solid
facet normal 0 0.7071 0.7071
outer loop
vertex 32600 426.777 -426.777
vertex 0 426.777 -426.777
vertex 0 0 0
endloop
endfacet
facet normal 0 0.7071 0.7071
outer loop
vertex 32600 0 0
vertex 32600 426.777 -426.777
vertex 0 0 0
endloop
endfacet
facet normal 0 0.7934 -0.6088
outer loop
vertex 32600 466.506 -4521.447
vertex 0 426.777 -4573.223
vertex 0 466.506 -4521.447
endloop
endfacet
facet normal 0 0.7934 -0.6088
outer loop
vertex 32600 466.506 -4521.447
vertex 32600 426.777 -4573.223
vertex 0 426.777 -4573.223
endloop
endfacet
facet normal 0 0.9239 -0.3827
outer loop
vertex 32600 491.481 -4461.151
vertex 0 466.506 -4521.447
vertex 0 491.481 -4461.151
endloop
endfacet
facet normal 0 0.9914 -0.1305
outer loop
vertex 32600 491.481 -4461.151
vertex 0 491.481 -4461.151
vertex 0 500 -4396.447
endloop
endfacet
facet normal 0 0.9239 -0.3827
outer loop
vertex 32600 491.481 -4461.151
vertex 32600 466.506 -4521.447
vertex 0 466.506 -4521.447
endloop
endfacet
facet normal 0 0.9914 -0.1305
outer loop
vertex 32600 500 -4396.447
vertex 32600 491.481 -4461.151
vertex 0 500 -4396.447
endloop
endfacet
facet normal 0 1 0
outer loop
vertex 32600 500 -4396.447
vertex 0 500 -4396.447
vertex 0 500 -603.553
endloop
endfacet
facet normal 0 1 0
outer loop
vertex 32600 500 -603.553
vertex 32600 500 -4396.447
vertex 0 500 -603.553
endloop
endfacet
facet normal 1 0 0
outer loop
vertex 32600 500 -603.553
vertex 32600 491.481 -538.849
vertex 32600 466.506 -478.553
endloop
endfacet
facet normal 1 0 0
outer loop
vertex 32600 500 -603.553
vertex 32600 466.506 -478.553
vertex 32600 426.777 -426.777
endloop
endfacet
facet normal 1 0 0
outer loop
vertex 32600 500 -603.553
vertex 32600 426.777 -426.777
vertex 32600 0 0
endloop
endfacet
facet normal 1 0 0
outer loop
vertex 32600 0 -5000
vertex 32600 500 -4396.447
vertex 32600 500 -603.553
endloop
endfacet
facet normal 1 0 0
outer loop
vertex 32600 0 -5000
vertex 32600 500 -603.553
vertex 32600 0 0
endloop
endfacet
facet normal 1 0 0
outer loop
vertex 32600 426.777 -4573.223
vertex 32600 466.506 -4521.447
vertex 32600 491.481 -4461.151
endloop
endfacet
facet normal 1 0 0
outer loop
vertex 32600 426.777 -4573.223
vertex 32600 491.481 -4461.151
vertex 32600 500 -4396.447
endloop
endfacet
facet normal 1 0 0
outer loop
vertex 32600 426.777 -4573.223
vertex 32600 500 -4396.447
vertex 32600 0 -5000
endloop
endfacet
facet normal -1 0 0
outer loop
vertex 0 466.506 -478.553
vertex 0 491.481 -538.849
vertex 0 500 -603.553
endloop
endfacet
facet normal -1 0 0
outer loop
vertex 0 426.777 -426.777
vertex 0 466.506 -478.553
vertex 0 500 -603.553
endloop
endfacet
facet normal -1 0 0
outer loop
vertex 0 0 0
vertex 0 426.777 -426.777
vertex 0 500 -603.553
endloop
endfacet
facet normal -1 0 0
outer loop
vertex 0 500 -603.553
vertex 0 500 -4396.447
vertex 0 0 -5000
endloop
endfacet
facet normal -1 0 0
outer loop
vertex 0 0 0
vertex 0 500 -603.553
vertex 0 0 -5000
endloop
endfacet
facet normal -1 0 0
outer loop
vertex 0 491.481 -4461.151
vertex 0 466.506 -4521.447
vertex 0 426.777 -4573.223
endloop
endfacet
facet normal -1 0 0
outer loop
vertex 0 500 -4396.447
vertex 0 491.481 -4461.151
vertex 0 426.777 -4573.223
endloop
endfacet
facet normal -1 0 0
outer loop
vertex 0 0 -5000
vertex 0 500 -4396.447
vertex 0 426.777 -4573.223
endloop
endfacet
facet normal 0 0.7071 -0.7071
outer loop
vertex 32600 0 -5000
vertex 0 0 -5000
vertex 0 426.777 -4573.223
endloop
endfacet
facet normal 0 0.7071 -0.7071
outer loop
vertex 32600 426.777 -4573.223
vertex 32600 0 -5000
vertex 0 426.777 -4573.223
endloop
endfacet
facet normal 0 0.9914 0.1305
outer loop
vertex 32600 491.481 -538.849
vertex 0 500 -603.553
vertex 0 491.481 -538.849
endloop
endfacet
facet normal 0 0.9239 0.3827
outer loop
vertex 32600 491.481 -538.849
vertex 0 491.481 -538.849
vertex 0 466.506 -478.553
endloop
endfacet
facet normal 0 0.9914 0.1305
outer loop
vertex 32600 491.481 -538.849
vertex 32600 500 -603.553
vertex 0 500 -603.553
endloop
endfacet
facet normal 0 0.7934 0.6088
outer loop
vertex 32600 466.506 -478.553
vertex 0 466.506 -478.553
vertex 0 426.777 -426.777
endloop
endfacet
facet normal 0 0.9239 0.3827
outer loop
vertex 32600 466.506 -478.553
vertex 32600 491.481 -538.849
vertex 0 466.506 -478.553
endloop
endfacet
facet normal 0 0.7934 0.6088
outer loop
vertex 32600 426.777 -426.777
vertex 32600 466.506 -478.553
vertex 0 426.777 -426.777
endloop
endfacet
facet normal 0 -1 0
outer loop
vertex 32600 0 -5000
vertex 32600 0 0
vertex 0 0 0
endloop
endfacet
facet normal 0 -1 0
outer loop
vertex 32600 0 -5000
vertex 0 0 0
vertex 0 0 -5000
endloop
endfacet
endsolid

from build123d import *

# Parameters (mm, degrees)
EXTRUDE_1_DEPTH = 32600
FILLET_1_R      = 250


with BuildPart() as part:
    # 草图1 → 凸台-拉伸1 (new body)
    with BuildSketch(Plane(origin=(0, 0, 0), x_dir=(0, 0, -1), z_dir=(1, 0, 0))):
        Polygon((0, 0), (5000, 0), (4500, 500), (500, 500), align=None)
    extrude(amount=EXTRUDE_1_DEPTH)

    # 圆角1
    fillet_1_edges = [part.edges().sort_by_distance(p)[0] for p in [
        (16300, 500, -500),
        (16300, 500, -4500),
    ]]
    fillet(fillet_1_edges, radius=FILLET_1_R)


solid = part.part
